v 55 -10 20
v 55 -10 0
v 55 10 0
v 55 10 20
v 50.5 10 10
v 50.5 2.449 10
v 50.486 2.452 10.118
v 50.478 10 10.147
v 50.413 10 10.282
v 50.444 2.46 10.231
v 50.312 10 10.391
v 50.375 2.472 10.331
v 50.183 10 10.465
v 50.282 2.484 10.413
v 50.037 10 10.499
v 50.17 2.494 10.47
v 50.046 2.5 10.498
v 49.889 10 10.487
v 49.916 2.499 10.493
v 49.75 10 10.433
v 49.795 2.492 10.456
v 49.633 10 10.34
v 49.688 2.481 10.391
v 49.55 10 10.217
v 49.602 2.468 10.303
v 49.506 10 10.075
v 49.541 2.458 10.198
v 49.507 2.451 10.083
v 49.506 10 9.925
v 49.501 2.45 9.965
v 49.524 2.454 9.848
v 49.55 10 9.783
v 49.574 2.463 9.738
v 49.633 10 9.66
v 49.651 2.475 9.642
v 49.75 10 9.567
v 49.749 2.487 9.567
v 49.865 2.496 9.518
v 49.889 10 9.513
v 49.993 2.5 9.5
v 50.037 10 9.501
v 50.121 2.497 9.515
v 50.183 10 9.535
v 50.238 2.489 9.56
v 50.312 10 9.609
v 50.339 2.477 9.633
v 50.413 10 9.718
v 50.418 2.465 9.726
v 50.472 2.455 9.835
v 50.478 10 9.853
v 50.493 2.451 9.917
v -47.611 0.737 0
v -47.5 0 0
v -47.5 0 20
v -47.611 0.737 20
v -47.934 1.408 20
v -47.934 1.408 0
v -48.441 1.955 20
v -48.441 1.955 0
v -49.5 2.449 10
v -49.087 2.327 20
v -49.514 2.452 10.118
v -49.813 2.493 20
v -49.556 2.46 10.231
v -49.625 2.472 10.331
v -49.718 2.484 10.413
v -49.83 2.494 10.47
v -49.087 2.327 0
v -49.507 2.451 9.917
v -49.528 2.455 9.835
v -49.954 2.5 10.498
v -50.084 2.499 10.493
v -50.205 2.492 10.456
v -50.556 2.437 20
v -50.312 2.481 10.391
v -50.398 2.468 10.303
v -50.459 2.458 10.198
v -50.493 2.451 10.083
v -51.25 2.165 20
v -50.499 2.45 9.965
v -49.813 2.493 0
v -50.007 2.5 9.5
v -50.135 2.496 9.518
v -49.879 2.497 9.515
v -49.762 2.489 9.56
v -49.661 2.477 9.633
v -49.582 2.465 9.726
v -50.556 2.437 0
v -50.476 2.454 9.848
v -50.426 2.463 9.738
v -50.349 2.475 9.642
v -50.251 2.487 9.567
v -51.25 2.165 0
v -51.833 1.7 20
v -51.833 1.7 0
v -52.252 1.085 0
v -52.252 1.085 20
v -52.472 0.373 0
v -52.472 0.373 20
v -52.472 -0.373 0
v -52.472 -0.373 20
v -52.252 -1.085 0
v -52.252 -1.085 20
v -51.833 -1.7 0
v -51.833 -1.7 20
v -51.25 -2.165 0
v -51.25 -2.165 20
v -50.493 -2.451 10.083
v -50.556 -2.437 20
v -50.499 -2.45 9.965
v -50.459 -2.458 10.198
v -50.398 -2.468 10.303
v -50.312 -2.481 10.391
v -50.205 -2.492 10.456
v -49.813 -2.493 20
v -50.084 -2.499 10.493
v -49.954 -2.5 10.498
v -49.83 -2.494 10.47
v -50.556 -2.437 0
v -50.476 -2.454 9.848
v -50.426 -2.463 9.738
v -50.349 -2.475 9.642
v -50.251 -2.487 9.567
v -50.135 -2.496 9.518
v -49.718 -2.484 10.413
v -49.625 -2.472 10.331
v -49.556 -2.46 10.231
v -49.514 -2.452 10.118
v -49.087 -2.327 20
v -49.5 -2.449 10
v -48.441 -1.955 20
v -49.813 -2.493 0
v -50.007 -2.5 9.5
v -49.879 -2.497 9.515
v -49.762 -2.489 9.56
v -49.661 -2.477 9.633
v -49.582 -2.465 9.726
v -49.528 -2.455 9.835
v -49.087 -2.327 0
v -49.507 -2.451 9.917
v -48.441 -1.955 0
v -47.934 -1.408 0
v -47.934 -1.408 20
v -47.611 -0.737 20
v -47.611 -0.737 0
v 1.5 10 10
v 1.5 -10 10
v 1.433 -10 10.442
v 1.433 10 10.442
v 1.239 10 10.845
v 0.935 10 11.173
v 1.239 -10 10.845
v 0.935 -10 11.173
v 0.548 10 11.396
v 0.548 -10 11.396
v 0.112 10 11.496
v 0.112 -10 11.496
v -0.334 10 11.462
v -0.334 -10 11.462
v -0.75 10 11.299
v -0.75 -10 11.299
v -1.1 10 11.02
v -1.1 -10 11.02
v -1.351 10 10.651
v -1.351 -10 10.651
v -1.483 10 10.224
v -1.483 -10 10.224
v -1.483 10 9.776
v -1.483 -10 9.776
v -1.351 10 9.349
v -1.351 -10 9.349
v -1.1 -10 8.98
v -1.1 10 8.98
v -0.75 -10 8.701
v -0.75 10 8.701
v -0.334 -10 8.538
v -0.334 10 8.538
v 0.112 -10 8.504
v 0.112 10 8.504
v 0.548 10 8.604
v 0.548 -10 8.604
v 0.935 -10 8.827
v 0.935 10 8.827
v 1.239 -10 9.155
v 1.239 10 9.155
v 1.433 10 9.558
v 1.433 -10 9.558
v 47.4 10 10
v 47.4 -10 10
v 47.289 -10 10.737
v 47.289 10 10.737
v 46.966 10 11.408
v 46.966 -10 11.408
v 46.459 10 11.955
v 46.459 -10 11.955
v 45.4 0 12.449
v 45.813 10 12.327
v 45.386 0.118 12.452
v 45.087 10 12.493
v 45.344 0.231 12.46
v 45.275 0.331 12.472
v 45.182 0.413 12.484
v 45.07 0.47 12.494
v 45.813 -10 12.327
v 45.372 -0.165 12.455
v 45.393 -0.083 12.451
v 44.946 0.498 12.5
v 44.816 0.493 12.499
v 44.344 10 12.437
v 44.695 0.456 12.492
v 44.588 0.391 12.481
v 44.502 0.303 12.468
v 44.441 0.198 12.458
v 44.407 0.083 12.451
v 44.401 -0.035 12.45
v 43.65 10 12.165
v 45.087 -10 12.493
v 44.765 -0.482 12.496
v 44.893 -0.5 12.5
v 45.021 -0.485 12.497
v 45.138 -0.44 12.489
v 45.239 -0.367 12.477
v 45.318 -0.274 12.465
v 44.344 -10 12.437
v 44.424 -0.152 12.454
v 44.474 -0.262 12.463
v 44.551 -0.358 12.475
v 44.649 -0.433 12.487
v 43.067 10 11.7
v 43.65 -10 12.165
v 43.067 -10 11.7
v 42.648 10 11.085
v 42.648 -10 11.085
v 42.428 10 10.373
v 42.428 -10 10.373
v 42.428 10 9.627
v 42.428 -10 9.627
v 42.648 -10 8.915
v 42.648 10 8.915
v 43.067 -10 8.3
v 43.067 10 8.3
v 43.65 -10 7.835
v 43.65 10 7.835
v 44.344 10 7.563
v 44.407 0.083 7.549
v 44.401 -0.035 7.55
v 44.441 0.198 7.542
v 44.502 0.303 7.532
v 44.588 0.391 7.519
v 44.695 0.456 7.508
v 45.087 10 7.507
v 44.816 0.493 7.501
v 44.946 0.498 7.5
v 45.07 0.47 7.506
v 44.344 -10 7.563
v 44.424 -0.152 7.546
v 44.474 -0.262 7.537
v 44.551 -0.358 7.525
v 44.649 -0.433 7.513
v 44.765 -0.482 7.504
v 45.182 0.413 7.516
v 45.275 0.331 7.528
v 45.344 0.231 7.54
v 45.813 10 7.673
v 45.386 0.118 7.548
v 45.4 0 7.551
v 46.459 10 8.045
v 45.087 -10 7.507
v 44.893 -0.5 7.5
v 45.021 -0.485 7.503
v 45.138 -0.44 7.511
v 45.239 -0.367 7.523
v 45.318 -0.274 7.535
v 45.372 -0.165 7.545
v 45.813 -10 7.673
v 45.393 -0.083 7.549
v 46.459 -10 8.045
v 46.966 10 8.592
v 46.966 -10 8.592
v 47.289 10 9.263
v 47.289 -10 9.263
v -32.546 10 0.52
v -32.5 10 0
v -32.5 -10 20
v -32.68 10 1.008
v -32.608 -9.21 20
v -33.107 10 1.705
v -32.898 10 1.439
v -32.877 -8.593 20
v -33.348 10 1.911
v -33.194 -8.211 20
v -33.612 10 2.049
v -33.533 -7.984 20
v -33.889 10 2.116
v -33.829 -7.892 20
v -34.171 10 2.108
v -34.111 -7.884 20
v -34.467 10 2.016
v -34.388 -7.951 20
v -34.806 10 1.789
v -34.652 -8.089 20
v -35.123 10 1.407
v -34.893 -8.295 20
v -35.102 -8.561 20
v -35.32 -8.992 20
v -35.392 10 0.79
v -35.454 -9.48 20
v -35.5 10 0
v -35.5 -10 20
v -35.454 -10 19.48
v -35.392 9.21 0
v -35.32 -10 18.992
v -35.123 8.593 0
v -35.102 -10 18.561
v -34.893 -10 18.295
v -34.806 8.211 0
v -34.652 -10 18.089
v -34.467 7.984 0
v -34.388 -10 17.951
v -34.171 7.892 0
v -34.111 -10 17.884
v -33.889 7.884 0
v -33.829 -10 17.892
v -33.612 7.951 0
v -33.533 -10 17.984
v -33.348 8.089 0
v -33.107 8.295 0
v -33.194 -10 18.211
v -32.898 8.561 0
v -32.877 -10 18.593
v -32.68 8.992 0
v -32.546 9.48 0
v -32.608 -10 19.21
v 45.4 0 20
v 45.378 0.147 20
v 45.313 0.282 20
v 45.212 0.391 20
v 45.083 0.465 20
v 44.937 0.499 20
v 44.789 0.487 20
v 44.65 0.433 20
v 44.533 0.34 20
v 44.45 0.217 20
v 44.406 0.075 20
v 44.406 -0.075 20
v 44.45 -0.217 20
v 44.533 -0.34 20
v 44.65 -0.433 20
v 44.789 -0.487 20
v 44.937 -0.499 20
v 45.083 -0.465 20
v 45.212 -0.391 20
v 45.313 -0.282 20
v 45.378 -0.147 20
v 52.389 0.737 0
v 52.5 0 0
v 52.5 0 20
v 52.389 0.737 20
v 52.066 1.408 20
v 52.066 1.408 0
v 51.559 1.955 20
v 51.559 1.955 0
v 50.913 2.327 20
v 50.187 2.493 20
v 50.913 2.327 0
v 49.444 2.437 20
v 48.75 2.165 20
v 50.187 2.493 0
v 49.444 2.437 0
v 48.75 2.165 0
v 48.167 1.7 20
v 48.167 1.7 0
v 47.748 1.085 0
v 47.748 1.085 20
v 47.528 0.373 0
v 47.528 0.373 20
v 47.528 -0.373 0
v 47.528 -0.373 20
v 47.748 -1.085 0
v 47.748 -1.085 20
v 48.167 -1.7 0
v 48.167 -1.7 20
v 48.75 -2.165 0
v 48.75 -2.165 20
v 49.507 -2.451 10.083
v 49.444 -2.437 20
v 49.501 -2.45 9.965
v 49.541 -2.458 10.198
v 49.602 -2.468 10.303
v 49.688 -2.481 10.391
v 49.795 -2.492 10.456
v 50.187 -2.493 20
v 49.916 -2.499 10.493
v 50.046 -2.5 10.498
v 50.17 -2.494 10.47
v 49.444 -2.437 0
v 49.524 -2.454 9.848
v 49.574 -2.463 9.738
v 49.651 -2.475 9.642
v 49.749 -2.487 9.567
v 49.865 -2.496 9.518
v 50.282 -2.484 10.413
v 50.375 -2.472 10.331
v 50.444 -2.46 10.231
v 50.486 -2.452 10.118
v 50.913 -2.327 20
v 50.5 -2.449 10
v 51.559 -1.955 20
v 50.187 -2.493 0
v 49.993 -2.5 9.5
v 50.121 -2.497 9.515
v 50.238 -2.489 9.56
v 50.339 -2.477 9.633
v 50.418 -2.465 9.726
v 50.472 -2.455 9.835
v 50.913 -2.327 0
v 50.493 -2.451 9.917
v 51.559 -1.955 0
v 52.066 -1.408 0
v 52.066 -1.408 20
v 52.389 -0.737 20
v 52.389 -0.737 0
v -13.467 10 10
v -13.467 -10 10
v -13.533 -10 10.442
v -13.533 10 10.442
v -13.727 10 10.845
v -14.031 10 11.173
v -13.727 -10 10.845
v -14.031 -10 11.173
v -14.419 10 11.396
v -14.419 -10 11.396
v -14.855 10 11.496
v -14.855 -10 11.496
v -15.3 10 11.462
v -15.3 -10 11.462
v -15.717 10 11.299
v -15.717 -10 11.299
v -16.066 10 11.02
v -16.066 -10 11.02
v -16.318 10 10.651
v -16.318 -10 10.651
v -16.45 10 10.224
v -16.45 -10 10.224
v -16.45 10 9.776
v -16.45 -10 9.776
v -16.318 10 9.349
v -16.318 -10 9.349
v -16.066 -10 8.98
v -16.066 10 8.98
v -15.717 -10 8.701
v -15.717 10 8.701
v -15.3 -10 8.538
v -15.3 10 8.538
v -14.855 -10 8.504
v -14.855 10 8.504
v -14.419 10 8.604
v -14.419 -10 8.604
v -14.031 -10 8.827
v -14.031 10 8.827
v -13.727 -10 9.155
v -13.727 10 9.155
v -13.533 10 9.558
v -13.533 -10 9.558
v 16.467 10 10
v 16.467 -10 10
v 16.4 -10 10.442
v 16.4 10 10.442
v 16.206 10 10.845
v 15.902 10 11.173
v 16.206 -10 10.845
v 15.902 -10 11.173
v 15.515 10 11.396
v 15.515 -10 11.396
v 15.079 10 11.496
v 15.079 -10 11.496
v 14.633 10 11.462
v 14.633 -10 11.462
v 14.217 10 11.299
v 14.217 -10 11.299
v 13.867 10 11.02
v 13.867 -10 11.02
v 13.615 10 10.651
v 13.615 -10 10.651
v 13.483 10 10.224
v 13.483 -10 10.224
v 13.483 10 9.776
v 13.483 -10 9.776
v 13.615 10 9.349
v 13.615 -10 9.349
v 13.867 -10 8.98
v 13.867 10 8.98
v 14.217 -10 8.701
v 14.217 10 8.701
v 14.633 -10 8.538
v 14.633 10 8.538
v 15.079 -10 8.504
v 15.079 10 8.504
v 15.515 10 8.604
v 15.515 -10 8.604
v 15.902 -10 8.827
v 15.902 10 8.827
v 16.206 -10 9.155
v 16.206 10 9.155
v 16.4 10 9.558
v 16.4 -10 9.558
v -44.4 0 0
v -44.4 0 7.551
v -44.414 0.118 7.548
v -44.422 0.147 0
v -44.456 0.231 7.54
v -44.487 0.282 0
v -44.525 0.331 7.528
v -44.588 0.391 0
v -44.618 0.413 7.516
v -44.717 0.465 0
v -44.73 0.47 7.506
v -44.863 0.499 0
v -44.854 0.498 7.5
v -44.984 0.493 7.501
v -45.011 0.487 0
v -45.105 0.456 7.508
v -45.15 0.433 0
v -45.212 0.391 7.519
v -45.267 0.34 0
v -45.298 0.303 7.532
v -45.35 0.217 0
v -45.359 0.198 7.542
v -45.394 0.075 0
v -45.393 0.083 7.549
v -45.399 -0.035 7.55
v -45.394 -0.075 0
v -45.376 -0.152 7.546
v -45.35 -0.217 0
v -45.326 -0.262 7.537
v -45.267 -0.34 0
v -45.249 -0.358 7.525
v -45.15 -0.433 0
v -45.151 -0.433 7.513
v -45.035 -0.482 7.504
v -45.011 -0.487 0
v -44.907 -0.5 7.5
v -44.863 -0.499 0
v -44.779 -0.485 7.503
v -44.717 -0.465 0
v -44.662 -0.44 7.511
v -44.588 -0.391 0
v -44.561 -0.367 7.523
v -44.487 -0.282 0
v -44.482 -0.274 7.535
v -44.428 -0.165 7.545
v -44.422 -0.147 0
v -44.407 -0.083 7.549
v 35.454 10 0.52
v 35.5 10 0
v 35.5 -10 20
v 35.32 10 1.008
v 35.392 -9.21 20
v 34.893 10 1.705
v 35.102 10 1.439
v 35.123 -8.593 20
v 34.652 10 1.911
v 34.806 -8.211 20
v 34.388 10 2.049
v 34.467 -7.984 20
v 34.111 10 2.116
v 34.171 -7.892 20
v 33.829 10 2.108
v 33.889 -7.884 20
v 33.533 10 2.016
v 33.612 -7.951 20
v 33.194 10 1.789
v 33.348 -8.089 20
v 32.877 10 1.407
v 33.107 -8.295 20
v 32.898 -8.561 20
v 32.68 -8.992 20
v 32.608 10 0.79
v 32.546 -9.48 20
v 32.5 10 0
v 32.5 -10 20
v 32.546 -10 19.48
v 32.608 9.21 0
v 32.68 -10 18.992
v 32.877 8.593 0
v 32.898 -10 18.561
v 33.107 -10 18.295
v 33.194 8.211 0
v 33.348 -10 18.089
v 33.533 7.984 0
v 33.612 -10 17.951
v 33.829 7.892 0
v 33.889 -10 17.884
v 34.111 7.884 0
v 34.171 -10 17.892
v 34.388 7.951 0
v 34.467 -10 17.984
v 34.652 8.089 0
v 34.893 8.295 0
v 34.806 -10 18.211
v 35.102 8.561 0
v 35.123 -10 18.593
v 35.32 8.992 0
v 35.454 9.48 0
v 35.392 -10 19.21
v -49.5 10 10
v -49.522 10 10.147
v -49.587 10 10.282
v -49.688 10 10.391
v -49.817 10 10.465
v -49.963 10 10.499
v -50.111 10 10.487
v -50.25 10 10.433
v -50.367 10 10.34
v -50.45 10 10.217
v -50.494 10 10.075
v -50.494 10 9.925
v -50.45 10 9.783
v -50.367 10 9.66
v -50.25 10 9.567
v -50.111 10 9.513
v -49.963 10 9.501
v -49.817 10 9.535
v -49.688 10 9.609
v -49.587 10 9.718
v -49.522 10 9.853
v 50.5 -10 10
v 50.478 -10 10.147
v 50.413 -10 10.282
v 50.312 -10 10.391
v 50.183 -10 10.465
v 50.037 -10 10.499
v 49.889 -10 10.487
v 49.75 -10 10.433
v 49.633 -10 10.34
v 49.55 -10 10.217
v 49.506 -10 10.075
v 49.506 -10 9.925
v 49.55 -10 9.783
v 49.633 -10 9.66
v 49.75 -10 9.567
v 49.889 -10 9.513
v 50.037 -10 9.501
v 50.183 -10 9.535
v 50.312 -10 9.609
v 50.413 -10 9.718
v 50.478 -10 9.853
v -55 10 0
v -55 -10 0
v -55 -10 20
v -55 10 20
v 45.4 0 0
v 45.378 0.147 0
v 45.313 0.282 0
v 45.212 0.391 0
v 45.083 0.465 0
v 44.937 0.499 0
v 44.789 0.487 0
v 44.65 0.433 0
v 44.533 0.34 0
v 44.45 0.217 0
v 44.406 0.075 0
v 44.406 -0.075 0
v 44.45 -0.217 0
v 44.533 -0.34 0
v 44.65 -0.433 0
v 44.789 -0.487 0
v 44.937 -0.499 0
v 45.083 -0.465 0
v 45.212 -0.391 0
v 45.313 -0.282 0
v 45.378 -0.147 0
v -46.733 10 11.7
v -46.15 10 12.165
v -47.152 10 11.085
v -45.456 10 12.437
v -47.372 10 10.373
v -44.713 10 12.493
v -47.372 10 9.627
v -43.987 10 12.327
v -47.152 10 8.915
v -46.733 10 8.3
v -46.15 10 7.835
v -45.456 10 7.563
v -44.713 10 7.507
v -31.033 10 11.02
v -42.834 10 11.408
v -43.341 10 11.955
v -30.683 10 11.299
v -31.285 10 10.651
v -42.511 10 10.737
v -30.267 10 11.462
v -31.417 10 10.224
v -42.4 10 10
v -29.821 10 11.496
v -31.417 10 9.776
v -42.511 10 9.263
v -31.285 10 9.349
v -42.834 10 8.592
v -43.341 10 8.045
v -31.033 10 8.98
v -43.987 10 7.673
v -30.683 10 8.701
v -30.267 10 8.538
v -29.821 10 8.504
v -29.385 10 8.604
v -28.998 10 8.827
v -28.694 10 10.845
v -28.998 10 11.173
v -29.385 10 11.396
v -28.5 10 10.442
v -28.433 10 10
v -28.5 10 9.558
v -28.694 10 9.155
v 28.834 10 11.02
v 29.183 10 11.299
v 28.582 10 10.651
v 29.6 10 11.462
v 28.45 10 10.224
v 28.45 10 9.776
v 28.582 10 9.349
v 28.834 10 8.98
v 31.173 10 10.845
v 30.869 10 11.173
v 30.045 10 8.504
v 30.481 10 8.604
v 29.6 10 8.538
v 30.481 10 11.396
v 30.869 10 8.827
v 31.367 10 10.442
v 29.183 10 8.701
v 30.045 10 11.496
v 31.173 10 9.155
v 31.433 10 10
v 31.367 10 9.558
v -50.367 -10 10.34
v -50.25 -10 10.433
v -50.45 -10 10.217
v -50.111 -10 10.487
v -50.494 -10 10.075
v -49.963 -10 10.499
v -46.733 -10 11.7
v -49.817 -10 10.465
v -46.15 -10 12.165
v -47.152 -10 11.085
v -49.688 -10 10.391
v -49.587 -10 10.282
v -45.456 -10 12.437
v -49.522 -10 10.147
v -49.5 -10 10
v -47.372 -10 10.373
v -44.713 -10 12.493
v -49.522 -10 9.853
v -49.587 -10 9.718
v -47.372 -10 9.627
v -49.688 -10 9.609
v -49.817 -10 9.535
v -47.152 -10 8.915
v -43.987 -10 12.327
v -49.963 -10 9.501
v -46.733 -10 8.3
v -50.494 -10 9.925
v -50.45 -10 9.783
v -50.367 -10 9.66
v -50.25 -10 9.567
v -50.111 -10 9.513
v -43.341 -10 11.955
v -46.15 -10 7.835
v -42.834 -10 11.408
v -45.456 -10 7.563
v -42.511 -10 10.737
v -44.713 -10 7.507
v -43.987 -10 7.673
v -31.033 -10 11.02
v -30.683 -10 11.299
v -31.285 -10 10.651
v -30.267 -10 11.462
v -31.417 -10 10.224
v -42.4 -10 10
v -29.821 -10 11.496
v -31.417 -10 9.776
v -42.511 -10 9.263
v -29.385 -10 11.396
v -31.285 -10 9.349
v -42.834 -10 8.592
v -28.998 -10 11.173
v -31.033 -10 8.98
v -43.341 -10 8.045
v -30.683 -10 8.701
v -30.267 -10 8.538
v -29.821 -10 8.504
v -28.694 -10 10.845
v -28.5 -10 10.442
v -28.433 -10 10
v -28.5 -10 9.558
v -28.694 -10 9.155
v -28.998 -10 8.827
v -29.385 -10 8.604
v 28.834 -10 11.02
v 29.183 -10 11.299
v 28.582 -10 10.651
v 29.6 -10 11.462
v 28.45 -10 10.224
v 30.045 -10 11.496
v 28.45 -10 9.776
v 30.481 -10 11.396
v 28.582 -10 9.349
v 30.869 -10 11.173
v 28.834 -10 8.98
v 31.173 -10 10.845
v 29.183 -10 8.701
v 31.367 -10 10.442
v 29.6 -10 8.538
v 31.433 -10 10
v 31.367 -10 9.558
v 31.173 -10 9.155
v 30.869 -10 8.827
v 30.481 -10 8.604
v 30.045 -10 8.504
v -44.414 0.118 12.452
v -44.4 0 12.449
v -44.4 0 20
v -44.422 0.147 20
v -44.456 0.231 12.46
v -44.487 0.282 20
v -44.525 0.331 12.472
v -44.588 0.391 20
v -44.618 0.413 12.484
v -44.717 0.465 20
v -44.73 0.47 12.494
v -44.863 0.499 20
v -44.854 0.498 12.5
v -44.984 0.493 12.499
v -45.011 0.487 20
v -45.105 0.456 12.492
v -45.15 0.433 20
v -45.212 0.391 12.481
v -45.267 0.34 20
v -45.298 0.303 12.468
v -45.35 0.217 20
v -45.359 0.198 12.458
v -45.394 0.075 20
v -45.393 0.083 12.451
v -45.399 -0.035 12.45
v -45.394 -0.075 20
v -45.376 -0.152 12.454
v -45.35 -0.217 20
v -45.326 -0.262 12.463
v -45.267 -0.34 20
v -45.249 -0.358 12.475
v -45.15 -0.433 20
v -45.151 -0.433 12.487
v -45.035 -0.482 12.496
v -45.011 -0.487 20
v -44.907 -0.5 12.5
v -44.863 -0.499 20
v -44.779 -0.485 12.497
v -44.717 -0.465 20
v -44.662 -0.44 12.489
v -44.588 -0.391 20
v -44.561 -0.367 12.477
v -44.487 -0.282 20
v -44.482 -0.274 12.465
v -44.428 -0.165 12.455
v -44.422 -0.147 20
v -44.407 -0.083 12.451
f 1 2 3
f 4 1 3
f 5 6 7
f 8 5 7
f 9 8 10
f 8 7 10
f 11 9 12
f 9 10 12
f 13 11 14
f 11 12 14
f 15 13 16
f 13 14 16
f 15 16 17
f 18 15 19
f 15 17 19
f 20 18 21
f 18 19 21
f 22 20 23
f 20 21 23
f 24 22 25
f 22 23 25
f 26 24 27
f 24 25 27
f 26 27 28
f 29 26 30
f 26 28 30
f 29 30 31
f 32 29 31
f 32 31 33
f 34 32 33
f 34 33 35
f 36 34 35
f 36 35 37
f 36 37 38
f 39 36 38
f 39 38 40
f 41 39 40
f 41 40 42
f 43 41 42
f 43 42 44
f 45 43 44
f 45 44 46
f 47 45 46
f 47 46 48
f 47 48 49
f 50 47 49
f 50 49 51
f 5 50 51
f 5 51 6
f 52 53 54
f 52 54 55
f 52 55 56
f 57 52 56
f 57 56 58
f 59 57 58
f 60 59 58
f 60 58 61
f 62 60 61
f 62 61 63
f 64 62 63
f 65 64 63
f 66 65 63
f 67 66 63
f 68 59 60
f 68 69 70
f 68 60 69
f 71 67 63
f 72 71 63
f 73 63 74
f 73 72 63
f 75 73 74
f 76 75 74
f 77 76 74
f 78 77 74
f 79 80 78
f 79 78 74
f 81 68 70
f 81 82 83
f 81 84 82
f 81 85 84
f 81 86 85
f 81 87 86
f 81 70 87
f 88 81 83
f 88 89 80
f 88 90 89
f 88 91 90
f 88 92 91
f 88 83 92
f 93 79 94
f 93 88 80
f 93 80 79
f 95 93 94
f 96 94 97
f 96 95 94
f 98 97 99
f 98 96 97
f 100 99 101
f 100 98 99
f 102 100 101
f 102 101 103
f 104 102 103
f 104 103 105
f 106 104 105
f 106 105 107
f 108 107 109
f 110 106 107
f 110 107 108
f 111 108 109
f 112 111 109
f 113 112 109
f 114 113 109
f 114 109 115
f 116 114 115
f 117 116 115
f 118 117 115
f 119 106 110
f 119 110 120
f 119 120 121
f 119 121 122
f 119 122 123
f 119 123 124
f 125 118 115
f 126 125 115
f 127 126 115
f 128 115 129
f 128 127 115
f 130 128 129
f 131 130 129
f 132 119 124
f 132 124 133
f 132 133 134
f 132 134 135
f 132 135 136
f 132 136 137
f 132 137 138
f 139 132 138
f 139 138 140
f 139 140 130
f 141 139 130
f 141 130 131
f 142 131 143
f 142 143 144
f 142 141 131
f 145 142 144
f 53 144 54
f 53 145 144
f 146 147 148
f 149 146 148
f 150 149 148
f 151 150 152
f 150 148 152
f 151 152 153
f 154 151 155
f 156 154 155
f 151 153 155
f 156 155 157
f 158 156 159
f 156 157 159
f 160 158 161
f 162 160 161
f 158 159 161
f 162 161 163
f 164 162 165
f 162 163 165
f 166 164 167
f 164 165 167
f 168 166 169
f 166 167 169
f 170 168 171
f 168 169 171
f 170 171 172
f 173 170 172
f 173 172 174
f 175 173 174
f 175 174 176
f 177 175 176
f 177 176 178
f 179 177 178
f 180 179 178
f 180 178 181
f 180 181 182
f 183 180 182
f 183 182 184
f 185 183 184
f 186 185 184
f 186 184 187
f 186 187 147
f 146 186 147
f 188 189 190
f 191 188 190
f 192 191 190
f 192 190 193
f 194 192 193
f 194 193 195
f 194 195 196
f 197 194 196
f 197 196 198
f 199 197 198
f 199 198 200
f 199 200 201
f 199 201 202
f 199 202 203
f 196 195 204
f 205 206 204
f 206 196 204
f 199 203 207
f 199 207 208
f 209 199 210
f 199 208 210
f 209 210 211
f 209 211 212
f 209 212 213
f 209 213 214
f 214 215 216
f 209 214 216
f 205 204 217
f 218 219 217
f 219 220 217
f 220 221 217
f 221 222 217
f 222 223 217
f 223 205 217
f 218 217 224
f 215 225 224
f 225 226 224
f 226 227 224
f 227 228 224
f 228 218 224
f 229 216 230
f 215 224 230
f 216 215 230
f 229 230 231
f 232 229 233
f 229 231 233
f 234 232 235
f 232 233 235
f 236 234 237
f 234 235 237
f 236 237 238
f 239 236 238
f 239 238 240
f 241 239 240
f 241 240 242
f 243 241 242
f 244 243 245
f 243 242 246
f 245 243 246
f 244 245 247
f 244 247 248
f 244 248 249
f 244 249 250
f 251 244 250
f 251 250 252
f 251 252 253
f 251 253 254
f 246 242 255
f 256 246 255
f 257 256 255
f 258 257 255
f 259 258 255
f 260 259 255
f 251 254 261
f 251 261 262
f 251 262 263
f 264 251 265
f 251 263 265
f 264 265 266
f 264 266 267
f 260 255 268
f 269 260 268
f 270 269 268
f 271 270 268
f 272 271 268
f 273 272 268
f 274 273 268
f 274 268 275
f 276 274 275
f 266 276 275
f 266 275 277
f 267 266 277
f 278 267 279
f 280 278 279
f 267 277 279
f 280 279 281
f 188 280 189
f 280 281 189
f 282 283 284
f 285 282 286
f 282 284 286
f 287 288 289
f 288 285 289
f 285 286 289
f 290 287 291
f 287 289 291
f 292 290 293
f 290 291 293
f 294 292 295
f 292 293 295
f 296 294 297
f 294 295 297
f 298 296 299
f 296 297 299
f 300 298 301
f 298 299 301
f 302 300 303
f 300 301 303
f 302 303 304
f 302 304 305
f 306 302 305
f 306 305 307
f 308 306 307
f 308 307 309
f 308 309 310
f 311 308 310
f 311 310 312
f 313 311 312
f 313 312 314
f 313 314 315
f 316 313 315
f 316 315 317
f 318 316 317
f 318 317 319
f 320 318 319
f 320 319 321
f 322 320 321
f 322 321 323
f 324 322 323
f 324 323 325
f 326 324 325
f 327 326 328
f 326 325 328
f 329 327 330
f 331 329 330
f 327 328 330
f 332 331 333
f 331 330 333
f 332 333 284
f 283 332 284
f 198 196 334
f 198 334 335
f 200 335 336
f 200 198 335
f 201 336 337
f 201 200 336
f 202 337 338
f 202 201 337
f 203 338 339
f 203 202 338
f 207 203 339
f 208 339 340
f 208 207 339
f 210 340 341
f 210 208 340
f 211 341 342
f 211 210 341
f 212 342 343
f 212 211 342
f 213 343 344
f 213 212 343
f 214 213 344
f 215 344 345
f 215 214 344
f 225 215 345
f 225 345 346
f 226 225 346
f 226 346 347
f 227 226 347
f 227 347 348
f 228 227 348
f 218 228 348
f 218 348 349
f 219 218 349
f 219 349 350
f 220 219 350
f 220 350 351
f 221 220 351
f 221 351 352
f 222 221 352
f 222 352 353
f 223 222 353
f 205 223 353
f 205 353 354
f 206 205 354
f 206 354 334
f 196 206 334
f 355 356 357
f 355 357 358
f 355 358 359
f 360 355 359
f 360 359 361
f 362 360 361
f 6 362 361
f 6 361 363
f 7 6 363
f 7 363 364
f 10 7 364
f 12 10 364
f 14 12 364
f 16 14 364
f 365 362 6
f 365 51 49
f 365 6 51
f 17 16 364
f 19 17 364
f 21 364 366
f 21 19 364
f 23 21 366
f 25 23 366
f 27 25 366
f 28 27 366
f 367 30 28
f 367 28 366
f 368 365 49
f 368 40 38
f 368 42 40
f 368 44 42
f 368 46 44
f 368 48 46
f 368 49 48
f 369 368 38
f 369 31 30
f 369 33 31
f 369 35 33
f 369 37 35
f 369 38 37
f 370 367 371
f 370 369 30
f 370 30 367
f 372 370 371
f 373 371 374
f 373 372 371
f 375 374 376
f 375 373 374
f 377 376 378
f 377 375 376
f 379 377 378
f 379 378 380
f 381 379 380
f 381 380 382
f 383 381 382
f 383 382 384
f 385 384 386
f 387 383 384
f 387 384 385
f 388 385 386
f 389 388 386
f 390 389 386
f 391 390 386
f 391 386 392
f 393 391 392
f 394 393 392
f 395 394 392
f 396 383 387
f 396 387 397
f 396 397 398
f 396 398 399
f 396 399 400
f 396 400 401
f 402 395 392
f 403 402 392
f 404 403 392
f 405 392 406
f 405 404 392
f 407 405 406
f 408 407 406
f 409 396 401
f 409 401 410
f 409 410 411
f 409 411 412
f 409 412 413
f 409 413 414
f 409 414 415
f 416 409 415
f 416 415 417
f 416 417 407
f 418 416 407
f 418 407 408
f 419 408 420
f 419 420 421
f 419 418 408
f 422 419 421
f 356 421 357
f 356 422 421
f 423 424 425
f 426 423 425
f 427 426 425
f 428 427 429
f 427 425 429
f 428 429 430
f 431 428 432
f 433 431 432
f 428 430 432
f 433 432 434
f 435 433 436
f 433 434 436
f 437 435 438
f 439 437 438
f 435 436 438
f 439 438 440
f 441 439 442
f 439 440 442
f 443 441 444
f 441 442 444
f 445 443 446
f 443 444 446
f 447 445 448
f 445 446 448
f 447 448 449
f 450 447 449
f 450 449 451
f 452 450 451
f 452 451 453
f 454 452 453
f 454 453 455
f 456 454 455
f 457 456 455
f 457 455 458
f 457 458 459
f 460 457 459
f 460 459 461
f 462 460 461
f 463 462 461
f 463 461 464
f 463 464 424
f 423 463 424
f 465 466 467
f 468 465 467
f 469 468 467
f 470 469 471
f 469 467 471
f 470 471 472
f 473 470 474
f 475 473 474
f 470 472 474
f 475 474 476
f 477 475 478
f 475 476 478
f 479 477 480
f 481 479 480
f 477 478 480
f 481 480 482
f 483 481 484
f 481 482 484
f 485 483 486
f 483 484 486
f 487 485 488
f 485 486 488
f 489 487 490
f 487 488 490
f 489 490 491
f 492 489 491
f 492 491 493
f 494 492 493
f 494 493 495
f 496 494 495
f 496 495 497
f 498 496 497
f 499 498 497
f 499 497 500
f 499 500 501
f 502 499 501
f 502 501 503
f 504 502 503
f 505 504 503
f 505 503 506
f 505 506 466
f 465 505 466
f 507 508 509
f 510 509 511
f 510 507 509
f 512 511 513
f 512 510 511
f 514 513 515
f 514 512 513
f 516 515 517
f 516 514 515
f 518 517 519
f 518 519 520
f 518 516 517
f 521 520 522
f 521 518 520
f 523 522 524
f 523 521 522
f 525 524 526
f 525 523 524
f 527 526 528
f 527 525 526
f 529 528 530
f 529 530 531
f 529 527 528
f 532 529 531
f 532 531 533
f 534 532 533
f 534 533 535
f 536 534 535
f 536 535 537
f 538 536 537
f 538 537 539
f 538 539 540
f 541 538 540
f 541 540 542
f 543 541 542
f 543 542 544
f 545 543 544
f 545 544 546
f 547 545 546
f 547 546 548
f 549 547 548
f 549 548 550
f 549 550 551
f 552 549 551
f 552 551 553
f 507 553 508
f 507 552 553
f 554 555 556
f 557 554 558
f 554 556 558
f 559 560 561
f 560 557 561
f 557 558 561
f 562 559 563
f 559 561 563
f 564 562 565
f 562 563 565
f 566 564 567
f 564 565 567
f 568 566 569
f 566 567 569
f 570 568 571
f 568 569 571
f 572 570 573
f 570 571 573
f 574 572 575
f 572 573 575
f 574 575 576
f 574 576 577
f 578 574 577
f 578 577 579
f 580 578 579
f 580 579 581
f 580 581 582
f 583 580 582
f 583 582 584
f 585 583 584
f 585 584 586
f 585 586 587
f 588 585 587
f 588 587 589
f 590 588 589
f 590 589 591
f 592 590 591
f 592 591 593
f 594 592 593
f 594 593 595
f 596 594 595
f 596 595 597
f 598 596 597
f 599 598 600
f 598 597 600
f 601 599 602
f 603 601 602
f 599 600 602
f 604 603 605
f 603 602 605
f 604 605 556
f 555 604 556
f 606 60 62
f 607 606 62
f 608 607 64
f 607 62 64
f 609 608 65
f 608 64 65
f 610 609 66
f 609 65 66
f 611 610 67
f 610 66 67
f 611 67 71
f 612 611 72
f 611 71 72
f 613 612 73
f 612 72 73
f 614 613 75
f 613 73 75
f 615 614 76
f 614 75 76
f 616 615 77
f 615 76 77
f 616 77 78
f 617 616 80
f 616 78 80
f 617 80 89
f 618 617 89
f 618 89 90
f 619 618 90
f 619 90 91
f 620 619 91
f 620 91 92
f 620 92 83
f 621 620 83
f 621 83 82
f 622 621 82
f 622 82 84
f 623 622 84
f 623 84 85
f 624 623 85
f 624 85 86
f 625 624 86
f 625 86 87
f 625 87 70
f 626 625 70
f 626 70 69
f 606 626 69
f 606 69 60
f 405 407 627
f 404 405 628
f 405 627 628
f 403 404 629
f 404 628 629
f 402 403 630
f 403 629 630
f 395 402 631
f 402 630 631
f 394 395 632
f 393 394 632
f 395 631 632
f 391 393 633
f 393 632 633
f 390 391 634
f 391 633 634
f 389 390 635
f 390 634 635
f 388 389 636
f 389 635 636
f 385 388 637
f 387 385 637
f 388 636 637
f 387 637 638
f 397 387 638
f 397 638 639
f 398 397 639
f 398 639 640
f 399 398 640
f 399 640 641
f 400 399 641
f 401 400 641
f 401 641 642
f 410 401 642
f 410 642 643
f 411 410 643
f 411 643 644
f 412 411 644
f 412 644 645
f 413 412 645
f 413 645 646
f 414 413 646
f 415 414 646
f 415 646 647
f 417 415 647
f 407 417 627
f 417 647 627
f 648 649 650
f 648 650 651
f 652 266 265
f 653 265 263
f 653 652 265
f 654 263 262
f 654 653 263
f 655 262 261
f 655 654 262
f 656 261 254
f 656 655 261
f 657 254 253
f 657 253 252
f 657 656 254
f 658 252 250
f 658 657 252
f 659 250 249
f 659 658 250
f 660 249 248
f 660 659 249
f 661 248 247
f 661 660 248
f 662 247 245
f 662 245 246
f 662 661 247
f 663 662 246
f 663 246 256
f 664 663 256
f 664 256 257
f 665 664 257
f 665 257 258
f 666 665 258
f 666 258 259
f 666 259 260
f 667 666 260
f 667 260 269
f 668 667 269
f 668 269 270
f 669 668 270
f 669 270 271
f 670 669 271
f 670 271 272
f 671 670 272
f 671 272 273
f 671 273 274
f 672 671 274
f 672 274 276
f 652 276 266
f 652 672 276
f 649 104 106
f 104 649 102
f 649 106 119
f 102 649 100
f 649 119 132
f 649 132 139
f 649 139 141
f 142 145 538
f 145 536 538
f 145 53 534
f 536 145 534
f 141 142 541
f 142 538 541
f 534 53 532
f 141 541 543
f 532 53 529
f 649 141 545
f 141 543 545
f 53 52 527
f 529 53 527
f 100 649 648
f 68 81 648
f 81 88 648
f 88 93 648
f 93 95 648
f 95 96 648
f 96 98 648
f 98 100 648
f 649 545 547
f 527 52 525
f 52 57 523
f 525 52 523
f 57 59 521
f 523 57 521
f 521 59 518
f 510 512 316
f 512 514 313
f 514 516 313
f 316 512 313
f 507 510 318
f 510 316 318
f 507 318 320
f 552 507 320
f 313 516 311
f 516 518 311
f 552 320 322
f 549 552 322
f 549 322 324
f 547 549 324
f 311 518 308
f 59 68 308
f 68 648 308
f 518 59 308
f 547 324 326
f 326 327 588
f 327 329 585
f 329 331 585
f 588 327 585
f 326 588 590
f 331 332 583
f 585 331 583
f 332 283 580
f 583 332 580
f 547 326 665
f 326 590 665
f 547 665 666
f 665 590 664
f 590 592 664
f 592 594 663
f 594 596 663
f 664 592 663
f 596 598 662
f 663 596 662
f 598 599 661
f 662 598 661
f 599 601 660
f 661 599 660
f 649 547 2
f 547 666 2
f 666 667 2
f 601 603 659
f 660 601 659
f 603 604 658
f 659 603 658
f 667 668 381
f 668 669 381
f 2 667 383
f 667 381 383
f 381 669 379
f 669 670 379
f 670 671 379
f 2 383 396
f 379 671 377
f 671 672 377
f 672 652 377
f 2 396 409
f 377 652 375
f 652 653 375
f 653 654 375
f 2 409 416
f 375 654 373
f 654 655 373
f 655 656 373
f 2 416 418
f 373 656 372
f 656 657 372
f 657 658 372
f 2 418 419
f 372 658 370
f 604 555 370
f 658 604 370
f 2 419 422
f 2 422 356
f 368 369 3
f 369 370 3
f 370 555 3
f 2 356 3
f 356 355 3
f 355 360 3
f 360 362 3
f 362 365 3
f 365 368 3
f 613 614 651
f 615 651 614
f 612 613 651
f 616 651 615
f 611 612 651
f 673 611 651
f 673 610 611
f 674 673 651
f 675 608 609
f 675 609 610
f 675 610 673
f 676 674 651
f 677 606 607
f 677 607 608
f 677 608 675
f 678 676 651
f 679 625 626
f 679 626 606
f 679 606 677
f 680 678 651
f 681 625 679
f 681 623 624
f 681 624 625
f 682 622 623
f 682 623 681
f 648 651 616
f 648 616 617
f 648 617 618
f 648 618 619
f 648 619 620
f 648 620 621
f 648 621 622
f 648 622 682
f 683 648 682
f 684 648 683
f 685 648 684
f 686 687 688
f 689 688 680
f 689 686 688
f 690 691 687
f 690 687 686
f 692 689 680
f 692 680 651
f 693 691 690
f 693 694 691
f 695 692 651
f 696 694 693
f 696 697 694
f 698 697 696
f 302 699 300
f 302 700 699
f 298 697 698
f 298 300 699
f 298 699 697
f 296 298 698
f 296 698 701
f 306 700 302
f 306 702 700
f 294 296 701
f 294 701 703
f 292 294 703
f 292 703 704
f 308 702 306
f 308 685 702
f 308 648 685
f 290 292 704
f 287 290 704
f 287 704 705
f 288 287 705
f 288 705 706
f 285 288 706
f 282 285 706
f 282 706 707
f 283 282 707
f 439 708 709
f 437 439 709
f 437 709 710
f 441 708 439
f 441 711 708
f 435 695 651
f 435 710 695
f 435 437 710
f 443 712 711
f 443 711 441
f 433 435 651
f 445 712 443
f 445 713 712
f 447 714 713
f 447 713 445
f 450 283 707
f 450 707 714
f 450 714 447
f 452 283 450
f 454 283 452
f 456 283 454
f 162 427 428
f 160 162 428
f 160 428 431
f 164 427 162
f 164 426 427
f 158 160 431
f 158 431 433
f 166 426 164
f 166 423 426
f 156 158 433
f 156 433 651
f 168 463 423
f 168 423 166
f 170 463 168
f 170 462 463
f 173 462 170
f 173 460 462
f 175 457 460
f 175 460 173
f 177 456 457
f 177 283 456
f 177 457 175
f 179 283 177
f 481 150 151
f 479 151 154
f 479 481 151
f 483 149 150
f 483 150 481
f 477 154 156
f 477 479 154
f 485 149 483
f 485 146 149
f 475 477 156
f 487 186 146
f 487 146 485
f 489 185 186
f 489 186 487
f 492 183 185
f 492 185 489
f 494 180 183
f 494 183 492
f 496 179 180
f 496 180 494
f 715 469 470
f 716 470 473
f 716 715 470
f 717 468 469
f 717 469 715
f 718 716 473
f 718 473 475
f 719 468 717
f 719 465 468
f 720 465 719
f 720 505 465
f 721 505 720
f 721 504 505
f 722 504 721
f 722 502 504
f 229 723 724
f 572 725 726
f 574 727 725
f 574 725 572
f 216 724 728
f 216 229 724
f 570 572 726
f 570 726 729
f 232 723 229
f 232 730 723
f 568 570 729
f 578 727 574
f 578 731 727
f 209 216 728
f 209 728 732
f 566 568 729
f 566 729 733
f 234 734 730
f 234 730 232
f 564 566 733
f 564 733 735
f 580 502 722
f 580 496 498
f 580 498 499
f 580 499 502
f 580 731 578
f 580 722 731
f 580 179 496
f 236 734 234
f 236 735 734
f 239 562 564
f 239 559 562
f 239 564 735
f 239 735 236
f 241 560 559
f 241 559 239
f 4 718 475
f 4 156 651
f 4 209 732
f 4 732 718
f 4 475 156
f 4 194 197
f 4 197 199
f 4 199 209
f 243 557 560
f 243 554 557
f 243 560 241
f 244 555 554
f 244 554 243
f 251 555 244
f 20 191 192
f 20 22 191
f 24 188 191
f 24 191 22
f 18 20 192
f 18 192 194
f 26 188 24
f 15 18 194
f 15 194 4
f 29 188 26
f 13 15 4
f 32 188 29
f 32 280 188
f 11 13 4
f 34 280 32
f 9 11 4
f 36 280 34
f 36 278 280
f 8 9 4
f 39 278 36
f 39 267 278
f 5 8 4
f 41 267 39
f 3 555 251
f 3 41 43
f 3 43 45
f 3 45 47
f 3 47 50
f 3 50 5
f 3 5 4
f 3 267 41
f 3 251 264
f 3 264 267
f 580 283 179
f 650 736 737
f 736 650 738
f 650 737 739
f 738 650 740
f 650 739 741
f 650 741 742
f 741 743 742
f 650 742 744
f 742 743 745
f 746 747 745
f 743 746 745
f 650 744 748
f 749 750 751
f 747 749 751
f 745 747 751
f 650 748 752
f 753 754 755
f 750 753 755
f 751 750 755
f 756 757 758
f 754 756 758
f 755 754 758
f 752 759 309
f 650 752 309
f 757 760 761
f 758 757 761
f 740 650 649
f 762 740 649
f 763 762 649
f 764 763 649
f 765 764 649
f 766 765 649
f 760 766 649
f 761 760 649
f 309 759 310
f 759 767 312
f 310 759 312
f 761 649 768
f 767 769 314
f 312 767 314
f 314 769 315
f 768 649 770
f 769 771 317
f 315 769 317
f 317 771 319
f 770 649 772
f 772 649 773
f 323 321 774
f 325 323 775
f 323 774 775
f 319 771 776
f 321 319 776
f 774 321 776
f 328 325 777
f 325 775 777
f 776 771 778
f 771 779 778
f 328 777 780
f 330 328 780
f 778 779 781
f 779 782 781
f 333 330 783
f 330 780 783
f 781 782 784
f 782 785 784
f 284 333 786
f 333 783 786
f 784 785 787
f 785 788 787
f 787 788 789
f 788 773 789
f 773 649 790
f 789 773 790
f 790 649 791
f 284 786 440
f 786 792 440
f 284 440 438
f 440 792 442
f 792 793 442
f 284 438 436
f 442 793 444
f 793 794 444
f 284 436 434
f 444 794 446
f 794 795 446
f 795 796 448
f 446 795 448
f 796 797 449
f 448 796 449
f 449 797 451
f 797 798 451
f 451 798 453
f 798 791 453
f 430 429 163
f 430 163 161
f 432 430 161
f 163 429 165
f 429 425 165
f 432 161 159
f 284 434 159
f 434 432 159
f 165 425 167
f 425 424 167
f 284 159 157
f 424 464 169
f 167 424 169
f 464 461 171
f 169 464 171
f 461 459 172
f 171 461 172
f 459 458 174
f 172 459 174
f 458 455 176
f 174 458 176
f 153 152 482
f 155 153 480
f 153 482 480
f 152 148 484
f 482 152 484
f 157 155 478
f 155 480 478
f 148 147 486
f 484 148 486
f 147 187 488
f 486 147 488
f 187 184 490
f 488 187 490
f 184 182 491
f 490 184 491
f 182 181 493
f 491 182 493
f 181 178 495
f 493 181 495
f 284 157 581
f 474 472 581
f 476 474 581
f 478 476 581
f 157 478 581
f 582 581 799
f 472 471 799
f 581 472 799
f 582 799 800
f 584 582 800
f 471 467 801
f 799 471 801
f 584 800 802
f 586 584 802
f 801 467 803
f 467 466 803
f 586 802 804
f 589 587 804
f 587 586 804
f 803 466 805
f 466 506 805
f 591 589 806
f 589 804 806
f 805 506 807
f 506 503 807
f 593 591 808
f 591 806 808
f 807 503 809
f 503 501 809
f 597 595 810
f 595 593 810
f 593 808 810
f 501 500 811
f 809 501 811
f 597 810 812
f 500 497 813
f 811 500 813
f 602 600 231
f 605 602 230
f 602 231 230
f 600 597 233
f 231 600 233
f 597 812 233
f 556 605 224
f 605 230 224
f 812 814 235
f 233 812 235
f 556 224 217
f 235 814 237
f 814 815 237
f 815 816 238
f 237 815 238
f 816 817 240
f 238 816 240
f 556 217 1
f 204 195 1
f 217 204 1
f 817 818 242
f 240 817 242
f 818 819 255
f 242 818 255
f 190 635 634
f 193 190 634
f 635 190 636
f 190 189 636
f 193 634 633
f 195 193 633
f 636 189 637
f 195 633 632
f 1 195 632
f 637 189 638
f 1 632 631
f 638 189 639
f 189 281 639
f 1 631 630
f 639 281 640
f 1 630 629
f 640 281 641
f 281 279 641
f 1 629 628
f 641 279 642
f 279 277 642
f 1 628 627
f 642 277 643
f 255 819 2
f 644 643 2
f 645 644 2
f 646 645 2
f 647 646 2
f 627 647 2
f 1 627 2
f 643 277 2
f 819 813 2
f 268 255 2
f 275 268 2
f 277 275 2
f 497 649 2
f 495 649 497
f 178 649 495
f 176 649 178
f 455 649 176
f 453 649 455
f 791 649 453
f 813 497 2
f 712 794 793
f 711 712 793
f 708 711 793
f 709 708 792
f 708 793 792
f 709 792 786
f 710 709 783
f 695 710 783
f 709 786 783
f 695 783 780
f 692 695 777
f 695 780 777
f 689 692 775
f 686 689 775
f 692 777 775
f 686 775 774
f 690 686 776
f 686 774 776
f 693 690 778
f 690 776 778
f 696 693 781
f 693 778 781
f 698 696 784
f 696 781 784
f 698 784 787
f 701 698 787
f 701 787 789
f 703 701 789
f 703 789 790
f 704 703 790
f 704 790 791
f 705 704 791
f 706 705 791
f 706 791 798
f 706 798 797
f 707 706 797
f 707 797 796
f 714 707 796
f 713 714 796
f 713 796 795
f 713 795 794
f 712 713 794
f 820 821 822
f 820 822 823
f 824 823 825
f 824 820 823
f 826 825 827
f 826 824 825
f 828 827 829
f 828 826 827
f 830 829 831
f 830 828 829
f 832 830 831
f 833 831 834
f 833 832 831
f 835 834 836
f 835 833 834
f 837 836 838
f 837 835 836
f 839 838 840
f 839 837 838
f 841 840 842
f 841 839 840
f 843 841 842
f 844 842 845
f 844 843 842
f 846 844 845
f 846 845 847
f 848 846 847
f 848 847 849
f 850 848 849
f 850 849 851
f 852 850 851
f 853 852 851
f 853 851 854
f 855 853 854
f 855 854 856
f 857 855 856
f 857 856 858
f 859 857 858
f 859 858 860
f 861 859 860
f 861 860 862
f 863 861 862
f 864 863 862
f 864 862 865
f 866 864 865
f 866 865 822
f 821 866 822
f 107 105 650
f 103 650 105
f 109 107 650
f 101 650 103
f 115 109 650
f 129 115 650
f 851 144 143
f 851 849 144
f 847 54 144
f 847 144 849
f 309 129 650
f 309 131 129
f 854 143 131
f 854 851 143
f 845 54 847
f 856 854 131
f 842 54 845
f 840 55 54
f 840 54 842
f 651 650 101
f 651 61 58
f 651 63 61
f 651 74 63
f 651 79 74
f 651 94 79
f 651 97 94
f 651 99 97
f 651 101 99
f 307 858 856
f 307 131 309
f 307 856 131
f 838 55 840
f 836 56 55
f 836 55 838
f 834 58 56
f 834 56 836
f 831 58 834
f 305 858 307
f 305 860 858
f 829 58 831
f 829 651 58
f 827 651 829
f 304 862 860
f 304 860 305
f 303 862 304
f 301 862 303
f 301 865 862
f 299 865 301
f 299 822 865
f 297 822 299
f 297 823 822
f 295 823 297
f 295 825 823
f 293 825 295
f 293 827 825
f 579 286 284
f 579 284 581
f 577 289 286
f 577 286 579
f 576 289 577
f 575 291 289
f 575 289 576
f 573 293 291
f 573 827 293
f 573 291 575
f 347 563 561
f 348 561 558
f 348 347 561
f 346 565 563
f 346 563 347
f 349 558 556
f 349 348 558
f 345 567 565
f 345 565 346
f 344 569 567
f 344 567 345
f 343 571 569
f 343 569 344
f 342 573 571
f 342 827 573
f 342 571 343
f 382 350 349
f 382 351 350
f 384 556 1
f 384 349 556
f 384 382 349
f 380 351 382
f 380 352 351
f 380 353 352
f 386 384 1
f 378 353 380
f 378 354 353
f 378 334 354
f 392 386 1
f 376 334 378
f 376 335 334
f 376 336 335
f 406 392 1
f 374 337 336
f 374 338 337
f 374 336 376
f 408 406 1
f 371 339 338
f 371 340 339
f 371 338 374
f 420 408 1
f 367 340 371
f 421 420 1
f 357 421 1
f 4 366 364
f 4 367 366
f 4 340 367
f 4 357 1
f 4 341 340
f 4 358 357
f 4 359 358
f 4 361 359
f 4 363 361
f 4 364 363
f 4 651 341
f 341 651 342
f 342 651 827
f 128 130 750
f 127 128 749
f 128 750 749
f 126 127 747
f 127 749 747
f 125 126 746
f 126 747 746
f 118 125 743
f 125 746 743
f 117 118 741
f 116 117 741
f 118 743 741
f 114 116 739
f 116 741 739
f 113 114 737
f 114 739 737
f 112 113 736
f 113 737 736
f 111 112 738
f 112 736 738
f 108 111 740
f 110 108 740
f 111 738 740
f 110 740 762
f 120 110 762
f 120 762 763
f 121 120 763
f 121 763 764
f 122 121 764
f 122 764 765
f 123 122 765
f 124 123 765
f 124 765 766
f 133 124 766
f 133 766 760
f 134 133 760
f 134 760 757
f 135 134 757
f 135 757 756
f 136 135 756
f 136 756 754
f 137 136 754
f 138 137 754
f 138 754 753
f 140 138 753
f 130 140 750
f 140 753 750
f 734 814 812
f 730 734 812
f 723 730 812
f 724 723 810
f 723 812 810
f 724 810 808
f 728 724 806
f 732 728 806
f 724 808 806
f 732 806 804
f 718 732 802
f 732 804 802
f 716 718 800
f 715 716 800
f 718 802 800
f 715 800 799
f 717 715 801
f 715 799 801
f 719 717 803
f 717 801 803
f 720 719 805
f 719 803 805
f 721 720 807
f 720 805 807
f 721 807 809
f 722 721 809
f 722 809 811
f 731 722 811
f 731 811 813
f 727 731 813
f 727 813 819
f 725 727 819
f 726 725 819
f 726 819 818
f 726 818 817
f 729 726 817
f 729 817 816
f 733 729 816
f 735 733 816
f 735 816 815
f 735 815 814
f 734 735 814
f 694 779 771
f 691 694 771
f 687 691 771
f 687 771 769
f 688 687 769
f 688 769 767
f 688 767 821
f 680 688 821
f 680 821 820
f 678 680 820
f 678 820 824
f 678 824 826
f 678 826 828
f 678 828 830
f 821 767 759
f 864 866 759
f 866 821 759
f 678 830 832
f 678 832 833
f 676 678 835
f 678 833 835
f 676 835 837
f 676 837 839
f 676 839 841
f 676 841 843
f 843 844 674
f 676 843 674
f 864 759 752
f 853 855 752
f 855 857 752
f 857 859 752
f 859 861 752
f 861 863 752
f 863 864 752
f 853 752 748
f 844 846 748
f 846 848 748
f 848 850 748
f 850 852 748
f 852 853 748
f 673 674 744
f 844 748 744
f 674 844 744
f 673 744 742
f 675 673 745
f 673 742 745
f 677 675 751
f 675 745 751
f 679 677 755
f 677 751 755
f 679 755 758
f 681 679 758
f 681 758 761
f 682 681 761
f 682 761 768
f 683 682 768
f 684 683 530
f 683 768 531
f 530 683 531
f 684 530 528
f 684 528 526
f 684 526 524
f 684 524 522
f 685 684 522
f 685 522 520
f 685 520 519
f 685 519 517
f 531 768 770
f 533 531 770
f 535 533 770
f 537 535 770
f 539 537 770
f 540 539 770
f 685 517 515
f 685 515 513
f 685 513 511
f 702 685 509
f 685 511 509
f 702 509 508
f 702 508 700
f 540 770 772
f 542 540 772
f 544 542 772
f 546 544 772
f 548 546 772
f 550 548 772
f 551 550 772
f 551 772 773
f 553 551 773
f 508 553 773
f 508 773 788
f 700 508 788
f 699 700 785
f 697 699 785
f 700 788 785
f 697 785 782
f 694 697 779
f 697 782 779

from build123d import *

# Parameters (mm, degrees)
F0_W     = 110
F0_H     = 20
F0_R     = 2.5
F0_R_2   = 0.5
F1_DEPTH = 20
F3_R     = 1.5
F4_DEPTH = 28.285271
F5_R     = 2.5
F5_R_2   = 0.5
F5_R_3   = 1.5
F6_DEPTH = 20.001


with BuildPart() as f1:
    # F0 (on Top) → F1 (new body)
    with BuildSketch(Plane.XY):
        Rectangle(F0_W, F0_H)
        with Locations((-50, 0)):
            Circle(F0_R, mode=Mode.SUBTRACT)
        with Locations((-44.9, 0)):
            Circle(F0_R_2, mode=Mode.SUBTRACT)
        with Locations((44.9, 0)):
            Circle(F0_R_2, mode=Mode.SUBTRACT)
        with Locations((50, 0)):
            Circle(F0_R, mode=Mode.SUBTRACT)
    extrude(amount=F1_DEPTH)

    # F3 (on face) → F4 (cut, through all)
    with BuildSketch(Plane(origin=(0, -15, 15), x_dir=(1, 0, 0), z_dir=(0, -0.707107, 0.707107))):
        with Locations((-34, 7.071068)):
            Circle(F3_R)
        with Locations((34, 7.071068)):
            Circle(F3_R)
    extrude(amount=-F4_DEPTH, mode=Mode.SUBTRACT)

    # F5 (on face) → F6 (cut, through all)
    with BuildSketch(Plane.XZ.offset(10)):
        with Locations((-44.9, 10)):
            Circle(F5_R)
        with Locations((44.9, 10)):
            Circle(F5_R)
        with Locations((-50, 10)):
            Circle(F5_R_2)
        with Locations((-29.933333, 10)):
            Circle(F5_R_3)
        with Locations((-14.966667, 10)):
            Circle(F5_R_3)
        with Locations((0, 10)):
            Circle(F5_R_3)
        with Locations((14.966667, 10)):
            Circle(F5_R_3)
        with Locations((29.933333, 10)):
            Circle(F5_R_3)
        with Locations((50, 10)):
            Circle(F5_R_2)
    extrude(amount=-F6_DEPTH, mode=Mode.SUBTRACT)


solid = f1.part
